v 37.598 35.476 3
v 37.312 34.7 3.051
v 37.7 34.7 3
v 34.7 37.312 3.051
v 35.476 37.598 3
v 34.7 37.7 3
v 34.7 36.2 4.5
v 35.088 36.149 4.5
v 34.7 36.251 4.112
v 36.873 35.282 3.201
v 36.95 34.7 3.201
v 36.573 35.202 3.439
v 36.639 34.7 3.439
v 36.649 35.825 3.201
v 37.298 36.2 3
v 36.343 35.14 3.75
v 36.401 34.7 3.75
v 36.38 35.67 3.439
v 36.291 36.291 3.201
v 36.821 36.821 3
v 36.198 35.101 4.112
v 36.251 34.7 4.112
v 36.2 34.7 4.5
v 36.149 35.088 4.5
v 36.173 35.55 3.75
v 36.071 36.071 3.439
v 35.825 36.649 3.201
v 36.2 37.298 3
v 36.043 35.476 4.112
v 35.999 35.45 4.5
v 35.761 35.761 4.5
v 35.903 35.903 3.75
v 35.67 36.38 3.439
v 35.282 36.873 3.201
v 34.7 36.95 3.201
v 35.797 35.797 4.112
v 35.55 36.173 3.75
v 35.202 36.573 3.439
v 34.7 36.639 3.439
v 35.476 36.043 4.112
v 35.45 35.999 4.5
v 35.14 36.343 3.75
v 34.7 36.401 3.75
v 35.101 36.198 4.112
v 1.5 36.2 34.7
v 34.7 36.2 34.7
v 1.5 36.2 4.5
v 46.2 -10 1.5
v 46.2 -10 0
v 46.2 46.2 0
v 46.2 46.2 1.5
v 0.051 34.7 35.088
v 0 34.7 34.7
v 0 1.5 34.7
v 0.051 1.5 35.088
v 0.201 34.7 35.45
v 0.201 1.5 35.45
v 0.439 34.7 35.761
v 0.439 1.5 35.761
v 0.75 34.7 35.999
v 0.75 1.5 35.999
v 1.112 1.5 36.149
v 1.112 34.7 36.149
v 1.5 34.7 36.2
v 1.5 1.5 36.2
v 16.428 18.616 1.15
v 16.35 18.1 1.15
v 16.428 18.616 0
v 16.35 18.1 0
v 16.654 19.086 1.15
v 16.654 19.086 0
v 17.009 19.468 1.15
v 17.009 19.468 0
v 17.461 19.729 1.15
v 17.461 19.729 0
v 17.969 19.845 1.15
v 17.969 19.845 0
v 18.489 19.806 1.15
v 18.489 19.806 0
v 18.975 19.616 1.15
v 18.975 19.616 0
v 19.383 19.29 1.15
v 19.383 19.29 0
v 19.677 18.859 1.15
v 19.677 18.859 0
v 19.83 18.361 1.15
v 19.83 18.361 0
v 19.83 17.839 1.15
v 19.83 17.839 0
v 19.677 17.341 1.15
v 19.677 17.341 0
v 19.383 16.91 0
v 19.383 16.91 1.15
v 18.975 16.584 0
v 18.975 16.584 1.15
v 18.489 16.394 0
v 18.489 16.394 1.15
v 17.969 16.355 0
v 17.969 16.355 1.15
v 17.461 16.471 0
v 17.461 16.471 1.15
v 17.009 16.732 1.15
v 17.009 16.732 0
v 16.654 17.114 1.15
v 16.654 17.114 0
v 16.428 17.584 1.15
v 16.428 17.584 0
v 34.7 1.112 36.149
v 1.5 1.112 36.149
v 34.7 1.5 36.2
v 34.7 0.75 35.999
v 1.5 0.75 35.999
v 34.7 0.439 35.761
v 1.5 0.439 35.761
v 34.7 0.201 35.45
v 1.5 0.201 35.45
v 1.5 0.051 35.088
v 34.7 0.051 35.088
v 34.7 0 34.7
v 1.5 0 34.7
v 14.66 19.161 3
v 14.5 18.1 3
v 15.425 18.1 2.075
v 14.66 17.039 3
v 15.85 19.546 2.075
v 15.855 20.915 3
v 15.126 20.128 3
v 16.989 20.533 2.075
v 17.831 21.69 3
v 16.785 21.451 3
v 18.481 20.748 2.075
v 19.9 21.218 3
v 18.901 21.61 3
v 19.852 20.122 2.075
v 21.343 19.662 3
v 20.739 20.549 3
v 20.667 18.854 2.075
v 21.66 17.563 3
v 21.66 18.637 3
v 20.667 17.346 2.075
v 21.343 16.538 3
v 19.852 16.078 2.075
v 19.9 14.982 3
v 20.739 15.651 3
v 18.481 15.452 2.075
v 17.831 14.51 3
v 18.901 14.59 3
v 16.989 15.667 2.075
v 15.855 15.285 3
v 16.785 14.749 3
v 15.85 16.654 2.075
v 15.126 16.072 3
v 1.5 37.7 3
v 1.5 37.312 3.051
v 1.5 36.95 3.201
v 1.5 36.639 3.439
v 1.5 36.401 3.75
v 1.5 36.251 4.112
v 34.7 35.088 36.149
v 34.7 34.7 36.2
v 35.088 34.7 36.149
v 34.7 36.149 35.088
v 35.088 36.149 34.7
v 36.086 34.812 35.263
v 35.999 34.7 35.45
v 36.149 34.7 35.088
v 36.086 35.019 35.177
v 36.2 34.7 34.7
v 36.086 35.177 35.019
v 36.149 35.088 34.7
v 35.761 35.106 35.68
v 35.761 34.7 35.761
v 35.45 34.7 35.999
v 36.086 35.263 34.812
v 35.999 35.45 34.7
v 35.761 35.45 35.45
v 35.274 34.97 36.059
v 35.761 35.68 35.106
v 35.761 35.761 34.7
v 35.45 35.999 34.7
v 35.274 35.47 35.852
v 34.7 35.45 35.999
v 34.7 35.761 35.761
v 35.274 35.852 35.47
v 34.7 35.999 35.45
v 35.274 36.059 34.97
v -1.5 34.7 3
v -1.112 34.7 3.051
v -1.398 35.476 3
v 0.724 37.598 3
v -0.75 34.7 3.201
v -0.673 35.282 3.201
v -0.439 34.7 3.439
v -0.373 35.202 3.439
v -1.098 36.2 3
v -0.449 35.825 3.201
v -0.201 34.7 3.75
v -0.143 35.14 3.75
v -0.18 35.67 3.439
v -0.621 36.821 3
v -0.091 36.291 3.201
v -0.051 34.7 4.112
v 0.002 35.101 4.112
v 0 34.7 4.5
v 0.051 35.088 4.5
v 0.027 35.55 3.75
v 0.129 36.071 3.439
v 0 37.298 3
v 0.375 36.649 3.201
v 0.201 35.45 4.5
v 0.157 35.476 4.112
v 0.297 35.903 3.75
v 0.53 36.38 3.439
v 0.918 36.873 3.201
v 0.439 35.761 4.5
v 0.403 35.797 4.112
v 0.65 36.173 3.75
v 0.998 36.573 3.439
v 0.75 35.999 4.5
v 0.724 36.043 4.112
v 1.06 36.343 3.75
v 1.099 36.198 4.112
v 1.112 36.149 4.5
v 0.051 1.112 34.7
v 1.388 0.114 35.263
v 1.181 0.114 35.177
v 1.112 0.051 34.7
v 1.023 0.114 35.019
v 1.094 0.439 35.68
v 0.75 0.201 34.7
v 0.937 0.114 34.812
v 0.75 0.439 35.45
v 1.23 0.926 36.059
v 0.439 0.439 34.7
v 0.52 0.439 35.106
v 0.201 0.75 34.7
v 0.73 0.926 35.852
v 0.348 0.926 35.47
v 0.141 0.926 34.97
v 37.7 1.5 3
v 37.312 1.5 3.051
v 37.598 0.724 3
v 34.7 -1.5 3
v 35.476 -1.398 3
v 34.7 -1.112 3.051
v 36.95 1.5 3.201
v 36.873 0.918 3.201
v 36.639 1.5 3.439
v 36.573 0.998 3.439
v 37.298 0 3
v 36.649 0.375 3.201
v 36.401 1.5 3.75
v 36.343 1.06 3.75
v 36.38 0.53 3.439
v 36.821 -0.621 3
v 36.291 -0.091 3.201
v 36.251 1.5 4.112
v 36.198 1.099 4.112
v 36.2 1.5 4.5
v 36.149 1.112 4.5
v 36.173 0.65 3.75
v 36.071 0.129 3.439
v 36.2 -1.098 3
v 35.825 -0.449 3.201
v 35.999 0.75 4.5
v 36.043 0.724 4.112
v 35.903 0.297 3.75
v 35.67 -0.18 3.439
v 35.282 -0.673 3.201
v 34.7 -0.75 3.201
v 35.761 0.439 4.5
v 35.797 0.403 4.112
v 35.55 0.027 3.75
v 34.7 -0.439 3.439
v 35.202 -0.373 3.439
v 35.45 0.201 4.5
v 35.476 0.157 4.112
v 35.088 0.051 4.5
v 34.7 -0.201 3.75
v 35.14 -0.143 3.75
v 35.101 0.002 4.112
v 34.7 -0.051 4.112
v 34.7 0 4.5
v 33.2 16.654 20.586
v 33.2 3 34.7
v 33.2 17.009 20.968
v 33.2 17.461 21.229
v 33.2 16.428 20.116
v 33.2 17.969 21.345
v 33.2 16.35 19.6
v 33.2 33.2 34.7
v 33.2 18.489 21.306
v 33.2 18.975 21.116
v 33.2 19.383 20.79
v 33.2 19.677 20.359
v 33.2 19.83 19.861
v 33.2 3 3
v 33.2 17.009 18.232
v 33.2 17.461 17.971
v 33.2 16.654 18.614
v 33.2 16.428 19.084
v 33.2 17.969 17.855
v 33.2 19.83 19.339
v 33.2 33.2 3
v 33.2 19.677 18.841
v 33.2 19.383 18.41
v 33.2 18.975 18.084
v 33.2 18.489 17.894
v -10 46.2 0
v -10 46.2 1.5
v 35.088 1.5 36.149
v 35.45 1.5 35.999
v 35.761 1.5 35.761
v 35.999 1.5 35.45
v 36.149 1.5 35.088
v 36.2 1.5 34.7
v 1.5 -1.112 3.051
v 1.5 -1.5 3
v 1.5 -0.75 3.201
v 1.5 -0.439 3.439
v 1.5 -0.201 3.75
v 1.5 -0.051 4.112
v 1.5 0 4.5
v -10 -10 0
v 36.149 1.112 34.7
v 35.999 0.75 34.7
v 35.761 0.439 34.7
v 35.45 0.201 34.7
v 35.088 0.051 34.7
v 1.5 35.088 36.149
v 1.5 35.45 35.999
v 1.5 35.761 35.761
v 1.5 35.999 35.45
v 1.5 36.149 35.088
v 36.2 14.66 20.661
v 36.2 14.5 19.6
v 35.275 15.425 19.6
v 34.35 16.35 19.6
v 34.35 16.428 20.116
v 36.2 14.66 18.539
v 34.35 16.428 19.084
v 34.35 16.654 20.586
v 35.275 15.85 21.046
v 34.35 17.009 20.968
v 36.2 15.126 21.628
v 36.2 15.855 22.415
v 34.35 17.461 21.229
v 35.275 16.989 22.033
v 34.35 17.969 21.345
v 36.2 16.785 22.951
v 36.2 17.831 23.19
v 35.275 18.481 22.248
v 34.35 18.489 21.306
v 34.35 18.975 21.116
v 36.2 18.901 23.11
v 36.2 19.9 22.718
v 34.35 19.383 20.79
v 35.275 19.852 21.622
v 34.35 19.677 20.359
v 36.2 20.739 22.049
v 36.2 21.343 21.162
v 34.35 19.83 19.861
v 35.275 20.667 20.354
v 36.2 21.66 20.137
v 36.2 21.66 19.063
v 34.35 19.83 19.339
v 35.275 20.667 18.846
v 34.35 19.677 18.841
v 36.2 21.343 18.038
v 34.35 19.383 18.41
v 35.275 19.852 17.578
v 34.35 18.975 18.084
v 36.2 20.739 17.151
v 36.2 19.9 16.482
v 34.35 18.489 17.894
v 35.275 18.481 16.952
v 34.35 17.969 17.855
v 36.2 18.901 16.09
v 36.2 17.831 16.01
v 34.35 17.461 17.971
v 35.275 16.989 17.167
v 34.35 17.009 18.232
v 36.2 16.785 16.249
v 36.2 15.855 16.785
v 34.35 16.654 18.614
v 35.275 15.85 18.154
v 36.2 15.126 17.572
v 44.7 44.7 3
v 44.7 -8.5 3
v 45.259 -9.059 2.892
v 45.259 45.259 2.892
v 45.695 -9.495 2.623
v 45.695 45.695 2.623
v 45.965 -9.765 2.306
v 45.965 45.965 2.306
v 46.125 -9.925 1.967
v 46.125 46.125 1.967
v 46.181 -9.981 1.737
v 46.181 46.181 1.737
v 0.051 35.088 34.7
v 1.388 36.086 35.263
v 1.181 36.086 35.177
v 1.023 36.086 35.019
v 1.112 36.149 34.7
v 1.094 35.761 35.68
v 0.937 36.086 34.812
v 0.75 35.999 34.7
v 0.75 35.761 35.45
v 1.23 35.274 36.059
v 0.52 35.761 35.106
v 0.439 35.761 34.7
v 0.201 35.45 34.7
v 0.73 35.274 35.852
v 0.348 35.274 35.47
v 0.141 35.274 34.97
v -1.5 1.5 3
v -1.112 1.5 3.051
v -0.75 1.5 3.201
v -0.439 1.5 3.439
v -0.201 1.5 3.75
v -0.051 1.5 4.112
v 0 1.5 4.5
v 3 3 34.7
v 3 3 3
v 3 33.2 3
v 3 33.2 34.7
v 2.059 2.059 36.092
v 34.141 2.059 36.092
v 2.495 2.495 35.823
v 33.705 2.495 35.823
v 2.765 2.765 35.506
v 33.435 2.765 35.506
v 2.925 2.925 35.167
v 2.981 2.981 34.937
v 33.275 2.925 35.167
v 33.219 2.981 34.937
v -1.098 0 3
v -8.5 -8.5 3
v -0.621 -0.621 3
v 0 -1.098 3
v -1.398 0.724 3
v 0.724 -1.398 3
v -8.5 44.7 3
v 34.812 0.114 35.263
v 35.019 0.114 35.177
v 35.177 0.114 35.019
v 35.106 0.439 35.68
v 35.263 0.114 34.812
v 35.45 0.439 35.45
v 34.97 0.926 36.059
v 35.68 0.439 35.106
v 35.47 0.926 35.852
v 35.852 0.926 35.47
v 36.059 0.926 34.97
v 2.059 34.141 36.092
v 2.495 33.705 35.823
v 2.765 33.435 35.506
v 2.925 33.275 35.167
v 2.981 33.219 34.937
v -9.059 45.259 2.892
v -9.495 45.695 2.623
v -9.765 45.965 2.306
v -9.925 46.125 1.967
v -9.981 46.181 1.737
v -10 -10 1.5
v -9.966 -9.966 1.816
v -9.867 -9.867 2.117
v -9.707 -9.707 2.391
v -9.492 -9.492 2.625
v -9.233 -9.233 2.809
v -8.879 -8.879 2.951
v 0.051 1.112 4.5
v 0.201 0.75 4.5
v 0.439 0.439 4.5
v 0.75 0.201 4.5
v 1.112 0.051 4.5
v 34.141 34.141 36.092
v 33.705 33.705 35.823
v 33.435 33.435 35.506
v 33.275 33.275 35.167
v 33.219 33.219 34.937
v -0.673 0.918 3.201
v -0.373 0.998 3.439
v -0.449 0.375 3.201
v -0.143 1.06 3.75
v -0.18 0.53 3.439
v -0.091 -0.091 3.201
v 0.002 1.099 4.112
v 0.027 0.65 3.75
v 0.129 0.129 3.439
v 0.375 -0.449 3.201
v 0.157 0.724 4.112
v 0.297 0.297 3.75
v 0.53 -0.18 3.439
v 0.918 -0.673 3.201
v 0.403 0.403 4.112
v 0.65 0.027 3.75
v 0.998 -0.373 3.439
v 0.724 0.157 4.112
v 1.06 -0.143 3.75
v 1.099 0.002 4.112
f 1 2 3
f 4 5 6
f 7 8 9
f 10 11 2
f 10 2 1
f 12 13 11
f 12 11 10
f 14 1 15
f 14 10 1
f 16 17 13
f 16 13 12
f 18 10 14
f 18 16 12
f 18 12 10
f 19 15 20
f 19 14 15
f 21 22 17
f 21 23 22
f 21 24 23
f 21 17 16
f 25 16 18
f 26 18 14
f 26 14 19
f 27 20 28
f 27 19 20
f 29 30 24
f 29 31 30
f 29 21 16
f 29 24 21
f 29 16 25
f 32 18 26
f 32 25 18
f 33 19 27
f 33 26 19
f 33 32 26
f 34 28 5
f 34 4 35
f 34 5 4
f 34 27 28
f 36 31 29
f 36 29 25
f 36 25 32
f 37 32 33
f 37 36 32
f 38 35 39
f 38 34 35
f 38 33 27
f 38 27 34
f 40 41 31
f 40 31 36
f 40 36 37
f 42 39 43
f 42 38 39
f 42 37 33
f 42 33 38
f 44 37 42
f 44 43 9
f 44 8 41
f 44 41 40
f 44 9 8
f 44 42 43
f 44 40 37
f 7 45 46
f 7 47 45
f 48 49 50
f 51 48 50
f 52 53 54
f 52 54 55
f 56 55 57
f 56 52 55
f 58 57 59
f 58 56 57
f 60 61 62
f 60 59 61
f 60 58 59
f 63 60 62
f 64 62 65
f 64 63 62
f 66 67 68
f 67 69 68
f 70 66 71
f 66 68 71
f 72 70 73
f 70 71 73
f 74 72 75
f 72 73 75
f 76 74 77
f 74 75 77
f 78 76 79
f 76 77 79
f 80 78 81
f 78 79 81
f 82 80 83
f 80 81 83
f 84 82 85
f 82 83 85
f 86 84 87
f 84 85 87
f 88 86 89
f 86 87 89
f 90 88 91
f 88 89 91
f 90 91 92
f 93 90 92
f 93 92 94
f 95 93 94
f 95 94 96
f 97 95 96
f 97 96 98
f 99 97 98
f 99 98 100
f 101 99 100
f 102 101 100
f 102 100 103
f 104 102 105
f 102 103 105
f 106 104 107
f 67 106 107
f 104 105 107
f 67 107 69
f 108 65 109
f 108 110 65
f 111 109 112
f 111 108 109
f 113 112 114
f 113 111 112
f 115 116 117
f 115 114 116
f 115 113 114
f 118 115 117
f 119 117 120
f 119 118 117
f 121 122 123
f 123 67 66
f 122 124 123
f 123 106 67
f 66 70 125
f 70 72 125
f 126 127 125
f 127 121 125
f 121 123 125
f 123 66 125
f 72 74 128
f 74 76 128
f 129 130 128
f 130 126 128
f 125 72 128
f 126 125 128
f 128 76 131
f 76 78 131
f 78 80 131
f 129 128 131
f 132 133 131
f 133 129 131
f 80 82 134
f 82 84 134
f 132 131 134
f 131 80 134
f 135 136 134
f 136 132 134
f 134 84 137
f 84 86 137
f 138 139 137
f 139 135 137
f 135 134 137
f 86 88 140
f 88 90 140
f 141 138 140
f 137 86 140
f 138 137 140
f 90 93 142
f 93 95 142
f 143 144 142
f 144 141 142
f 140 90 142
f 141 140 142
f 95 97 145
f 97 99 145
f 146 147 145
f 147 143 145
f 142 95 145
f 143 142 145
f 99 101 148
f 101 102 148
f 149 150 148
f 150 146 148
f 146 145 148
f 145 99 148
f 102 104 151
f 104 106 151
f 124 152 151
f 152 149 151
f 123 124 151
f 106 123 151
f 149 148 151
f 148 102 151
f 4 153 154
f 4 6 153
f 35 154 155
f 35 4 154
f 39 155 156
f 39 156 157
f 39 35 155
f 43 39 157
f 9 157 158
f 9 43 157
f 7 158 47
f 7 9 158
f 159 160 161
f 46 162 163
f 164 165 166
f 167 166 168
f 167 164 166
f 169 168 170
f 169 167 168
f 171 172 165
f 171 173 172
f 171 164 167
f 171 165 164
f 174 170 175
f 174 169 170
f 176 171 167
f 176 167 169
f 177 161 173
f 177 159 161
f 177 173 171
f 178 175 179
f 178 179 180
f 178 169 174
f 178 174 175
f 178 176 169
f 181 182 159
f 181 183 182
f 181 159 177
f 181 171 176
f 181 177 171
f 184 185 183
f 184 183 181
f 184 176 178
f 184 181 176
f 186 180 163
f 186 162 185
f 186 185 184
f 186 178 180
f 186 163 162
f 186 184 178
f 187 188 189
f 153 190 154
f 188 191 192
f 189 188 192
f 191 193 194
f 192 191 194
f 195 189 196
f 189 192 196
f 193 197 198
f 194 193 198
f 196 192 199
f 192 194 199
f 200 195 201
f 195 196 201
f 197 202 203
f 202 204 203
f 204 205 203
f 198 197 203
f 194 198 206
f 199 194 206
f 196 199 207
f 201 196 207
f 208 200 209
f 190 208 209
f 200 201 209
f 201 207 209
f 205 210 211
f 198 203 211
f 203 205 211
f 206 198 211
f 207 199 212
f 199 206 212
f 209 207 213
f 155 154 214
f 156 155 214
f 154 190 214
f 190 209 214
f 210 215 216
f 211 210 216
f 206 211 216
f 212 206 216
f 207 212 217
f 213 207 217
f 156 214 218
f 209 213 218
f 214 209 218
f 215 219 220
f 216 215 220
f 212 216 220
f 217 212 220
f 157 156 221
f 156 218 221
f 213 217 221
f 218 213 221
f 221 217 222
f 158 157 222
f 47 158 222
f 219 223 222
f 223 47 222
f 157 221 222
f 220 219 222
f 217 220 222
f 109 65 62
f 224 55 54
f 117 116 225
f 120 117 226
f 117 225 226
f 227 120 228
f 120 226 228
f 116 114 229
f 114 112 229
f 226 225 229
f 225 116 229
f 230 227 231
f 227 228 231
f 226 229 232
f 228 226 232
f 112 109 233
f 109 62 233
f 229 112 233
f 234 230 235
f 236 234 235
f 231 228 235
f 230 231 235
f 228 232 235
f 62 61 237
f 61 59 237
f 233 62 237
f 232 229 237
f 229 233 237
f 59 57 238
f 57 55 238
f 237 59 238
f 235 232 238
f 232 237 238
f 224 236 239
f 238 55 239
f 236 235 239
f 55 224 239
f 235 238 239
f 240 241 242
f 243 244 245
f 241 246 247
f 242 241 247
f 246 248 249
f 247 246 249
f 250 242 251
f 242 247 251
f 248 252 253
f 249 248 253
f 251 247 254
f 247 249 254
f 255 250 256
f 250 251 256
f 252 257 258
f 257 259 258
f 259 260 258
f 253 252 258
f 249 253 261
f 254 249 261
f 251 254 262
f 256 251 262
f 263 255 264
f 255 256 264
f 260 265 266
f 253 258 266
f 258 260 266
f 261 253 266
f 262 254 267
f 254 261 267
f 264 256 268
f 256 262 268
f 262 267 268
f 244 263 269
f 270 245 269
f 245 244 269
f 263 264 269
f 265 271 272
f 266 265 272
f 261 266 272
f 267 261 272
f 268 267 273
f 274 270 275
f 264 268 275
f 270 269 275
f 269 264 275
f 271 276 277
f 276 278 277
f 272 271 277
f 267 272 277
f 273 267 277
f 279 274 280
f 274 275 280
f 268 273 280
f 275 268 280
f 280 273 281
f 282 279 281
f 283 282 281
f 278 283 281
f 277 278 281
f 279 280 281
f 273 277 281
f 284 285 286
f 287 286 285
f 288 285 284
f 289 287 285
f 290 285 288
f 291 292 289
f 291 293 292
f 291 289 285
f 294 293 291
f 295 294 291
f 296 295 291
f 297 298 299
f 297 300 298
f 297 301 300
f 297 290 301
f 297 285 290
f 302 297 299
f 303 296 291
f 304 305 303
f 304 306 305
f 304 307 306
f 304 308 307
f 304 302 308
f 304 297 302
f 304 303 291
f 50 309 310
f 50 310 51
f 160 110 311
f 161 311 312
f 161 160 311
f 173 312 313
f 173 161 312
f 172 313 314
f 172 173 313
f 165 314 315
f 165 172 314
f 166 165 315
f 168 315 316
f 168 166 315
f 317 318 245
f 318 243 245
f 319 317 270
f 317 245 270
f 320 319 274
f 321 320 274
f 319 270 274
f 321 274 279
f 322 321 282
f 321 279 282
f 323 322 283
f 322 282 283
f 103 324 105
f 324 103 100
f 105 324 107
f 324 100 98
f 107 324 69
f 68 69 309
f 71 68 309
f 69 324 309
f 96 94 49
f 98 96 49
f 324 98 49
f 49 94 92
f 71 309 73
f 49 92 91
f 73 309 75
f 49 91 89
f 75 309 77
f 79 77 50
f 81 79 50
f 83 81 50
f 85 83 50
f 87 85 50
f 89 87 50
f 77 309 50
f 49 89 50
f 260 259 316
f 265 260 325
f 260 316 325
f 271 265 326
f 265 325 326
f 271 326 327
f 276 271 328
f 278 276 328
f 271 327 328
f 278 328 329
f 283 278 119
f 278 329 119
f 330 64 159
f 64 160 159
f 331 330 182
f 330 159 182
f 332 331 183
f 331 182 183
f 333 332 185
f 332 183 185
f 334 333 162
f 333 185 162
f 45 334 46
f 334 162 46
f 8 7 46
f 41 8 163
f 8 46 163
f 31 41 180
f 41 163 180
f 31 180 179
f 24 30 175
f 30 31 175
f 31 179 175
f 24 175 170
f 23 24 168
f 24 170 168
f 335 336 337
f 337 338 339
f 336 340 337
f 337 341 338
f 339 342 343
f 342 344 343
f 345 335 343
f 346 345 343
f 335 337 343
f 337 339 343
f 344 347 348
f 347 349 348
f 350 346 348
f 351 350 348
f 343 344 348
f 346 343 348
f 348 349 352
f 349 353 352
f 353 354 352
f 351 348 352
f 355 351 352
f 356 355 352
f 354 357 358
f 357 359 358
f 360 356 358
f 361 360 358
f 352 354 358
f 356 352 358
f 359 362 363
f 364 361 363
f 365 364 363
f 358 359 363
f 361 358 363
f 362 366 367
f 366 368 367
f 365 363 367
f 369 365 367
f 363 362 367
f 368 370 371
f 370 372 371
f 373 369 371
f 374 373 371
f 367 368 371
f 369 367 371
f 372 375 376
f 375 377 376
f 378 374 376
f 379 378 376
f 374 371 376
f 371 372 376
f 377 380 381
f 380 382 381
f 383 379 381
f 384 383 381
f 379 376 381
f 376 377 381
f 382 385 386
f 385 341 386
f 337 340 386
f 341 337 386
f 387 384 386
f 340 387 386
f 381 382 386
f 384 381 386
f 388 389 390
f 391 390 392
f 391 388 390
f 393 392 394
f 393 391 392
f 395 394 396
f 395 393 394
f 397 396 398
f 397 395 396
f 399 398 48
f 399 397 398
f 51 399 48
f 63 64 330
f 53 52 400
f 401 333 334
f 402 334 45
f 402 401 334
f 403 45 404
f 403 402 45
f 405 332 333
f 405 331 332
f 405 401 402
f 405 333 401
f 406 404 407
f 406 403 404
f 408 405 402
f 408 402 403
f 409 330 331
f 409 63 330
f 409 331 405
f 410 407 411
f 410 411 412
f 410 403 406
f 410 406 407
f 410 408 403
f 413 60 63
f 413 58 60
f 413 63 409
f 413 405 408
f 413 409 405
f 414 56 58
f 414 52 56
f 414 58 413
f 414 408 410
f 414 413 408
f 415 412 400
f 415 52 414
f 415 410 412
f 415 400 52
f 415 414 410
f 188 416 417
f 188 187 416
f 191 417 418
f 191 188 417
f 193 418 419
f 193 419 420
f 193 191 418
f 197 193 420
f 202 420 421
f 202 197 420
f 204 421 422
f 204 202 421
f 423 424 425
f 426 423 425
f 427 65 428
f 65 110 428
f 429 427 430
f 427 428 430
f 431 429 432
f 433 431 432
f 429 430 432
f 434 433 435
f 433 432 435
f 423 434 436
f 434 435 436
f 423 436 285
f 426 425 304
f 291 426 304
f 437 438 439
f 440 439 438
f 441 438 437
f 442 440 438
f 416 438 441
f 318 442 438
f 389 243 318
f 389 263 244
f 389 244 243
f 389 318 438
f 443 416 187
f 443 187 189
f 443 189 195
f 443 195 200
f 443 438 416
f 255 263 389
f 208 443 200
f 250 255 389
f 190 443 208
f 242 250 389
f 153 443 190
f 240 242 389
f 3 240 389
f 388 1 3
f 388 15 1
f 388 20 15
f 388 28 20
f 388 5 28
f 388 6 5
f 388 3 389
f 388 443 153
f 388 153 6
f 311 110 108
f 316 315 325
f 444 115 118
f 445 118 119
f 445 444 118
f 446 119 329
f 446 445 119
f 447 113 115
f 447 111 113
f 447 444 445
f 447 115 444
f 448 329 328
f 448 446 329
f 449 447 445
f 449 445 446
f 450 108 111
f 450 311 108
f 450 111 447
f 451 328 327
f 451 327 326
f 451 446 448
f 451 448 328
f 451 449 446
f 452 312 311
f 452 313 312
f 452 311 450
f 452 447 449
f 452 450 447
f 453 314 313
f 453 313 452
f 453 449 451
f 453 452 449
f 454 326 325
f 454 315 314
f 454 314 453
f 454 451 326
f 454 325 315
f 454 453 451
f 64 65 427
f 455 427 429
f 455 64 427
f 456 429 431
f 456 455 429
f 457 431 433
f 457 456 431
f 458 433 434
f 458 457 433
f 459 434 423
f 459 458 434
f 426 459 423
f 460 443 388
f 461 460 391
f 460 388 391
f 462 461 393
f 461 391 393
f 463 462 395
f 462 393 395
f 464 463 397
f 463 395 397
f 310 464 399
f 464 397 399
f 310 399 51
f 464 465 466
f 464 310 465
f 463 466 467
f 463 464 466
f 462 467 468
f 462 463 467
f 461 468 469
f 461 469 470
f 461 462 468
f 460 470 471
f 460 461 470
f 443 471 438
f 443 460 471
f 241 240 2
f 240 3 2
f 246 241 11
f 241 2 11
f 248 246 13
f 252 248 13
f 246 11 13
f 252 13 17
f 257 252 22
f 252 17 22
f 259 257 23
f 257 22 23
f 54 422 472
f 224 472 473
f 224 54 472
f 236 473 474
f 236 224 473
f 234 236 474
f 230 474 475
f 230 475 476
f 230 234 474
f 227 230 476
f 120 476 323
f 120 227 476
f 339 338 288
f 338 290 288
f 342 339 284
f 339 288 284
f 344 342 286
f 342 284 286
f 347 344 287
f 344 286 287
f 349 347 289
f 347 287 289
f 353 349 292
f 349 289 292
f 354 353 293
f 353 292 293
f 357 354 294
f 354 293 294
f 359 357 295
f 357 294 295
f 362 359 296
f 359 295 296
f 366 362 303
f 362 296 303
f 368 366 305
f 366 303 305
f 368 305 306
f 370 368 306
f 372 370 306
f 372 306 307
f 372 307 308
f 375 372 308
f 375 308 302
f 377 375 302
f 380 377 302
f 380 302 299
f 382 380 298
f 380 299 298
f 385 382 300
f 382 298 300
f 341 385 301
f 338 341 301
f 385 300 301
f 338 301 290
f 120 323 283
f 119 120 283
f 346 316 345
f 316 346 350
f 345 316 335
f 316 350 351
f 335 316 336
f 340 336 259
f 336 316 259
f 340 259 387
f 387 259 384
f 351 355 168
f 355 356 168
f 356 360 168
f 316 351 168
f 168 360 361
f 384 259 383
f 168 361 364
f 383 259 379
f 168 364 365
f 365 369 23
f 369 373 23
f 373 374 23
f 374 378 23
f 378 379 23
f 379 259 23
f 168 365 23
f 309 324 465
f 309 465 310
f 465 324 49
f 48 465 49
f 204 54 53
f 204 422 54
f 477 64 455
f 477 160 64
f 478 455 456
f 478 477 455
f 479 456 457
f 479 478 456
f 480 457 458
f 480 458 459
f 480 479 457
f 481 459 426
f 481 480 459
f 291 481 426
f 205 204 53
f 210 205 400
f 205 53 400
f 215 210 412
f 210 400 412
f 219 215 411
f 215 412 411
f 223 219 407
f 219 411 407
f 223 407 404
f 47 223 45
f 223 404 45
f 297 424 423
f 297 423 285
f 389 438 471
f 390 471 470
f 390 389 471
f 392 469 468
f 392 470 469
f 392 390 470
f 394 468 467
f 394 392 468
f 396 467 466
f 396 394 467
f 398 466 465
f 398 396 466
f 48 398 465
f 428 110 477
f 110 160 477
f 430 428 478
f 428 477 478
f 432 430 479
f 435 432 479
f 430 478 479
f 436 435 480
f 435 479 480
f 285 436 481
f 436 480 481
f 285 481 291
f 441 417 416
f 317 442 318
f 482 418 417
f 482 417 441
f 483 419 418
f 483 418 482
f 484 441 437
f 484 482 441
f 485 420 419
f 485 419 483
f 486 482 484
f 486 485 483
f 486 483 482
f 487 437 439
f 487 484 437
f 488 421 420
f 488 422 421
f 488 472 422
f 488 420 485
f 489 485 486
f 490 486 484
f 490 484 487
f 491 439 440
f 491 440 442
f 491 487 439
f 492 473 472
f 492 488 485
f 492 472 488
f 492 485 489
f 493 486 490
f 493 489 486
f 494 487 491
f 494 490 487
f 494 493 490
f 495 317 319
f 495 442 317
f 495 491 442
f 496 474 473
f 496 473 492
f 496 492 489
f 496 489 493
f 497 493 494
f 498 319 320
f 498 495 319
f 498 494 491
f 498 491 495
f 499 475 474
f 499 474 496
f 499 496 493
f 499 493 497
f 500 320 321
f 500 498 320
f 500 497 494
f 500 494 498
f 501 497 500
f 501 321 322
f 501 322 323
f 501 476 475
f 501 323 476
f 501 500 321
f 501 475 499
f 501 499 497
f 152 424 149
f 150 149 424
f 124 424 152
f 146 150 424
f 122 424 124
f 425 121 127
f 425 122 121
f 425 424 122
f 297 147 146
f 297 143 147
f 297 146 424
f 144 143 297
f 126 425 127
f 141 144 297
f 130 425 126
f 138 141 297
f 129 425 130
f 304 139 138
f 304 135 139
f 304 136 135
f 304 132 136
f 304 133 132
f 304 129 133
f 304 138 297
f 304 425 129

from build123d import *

# Parameters (mm, degrees)
F0_W           = 56.2
F0_H           = 56.2
F1_DEPTH       = 3
F2_W           = 36.2
F2_H           = 36.2
F2_W_2         = 30.2
F2_H_2         = 30.2
F3_DEPTH       = 33.2
F4_D           = 3.5
F4_DEPTH       = 13.5
F4_CSINK_D     = 7.2
F4_CSINK_ANGLE = 90
F4_TIP         = 1.0515060833
F5_R           = 1.49999
F7_D           = 3.5
F7_DEPTH       = 13.5
F7_CSINK_D     = 7.2
F7_CSINK_ANGLE = 90
F7_TIP         = 1.0515060833


# Not quite as in the source:
# - a fillet or chamfer is up to 0.001 mm smaller than in the source, because OpenCascade refuses the exact size
# - a feature names something its author has since deleted; it is built from what else it names


with BuildPart() as f1:
    # F0 (on Top) → F1 (new body)
    with BuildSketch(Plane.XY):
        with Locations((18.1, 18.1)):
            Rectangle(F0_W, F0_H)
    extrude(amount=F1_DEPTH)

    # F2 (on face) → F3 (join)
    with BuildSketch(Plane.XY.offset(3)):
        with Locations((18.1, 18.1)):
            Rectangle(F2_W, F2_H)
        with Locations((18.1, 18.1)):
            Rectangle(F2_W_2, F2_H_2, mode=Mode.SUBTRACT)
    extrude(amount=F3_DEPTH)

    # F4
    with Locations(Plane.XY.offset(3)):
        with Locations((18.1, 18.1)):
            CounterSinkHole(F4_D / 2, F4_CSINK_D / 2, depth=F4_DEPTH, counter_sink_angle=F4_CSINK_ANGLE)
            with Locations((0, 0, -(F4_DEPTH + F4_TIP / 2))):  # 118° drill point
                Cone(0, F4_D / 2, F4_TIP, mode=Mode.SUBTRACT)

    # F5 (radius 1.5 in the source; OpenCascade refuses exactly that, so slightly less here)
    f5_edges = [f1.edges().sort_by_distance(p)[0] for p in [
        (33.2, 18.1, 36.2),
        (18.1, 3, 36.2),
        (18.1, 0, 3),
        (18.1, 33.2, 36.2),
        (3, 18.1, 36.2),
        (0, 18.1, 36.2),
        (18.1, 36.2, 36.2),
        (36.2, 18.1, 36.2),
        (18.1, 0, 36.2),
        (36.2, 0, 19.6),
        (0, 0, 19.6),
        (0, 18.1, 3),
        (18.1, 36.2, 3),
        (36.2, 36.2, 19.6),
        (0, 36.2, 19.6),
        (18.1, 46.2, 3),
        (-10, 18.1, 3),
        (18.1, -10, 3),
        (46.2, 18.1, 3),
        (36.2, 18.1, 3),
    ]]
    fillet(f5_edges, radius=F5_R)

    # F7
    with Locations(Plane.YZ.offset(36.2)):
        with Locations((18.1, 19.6)):
            CounterSinkHole(F7_D / 2, F7_CSINK_D / 2, depth=F7_DEPTH, counter_sink_angle=F7_CSINK_ANGLE)
            with Locations((0, 0, -(F7_DEPTH + F7_TIP / 2))):  # 118° drill point
                Cone(0, F7_D / 2, F7_TIP, mode=Mode.SUBTRACT)


solid = f1.part
